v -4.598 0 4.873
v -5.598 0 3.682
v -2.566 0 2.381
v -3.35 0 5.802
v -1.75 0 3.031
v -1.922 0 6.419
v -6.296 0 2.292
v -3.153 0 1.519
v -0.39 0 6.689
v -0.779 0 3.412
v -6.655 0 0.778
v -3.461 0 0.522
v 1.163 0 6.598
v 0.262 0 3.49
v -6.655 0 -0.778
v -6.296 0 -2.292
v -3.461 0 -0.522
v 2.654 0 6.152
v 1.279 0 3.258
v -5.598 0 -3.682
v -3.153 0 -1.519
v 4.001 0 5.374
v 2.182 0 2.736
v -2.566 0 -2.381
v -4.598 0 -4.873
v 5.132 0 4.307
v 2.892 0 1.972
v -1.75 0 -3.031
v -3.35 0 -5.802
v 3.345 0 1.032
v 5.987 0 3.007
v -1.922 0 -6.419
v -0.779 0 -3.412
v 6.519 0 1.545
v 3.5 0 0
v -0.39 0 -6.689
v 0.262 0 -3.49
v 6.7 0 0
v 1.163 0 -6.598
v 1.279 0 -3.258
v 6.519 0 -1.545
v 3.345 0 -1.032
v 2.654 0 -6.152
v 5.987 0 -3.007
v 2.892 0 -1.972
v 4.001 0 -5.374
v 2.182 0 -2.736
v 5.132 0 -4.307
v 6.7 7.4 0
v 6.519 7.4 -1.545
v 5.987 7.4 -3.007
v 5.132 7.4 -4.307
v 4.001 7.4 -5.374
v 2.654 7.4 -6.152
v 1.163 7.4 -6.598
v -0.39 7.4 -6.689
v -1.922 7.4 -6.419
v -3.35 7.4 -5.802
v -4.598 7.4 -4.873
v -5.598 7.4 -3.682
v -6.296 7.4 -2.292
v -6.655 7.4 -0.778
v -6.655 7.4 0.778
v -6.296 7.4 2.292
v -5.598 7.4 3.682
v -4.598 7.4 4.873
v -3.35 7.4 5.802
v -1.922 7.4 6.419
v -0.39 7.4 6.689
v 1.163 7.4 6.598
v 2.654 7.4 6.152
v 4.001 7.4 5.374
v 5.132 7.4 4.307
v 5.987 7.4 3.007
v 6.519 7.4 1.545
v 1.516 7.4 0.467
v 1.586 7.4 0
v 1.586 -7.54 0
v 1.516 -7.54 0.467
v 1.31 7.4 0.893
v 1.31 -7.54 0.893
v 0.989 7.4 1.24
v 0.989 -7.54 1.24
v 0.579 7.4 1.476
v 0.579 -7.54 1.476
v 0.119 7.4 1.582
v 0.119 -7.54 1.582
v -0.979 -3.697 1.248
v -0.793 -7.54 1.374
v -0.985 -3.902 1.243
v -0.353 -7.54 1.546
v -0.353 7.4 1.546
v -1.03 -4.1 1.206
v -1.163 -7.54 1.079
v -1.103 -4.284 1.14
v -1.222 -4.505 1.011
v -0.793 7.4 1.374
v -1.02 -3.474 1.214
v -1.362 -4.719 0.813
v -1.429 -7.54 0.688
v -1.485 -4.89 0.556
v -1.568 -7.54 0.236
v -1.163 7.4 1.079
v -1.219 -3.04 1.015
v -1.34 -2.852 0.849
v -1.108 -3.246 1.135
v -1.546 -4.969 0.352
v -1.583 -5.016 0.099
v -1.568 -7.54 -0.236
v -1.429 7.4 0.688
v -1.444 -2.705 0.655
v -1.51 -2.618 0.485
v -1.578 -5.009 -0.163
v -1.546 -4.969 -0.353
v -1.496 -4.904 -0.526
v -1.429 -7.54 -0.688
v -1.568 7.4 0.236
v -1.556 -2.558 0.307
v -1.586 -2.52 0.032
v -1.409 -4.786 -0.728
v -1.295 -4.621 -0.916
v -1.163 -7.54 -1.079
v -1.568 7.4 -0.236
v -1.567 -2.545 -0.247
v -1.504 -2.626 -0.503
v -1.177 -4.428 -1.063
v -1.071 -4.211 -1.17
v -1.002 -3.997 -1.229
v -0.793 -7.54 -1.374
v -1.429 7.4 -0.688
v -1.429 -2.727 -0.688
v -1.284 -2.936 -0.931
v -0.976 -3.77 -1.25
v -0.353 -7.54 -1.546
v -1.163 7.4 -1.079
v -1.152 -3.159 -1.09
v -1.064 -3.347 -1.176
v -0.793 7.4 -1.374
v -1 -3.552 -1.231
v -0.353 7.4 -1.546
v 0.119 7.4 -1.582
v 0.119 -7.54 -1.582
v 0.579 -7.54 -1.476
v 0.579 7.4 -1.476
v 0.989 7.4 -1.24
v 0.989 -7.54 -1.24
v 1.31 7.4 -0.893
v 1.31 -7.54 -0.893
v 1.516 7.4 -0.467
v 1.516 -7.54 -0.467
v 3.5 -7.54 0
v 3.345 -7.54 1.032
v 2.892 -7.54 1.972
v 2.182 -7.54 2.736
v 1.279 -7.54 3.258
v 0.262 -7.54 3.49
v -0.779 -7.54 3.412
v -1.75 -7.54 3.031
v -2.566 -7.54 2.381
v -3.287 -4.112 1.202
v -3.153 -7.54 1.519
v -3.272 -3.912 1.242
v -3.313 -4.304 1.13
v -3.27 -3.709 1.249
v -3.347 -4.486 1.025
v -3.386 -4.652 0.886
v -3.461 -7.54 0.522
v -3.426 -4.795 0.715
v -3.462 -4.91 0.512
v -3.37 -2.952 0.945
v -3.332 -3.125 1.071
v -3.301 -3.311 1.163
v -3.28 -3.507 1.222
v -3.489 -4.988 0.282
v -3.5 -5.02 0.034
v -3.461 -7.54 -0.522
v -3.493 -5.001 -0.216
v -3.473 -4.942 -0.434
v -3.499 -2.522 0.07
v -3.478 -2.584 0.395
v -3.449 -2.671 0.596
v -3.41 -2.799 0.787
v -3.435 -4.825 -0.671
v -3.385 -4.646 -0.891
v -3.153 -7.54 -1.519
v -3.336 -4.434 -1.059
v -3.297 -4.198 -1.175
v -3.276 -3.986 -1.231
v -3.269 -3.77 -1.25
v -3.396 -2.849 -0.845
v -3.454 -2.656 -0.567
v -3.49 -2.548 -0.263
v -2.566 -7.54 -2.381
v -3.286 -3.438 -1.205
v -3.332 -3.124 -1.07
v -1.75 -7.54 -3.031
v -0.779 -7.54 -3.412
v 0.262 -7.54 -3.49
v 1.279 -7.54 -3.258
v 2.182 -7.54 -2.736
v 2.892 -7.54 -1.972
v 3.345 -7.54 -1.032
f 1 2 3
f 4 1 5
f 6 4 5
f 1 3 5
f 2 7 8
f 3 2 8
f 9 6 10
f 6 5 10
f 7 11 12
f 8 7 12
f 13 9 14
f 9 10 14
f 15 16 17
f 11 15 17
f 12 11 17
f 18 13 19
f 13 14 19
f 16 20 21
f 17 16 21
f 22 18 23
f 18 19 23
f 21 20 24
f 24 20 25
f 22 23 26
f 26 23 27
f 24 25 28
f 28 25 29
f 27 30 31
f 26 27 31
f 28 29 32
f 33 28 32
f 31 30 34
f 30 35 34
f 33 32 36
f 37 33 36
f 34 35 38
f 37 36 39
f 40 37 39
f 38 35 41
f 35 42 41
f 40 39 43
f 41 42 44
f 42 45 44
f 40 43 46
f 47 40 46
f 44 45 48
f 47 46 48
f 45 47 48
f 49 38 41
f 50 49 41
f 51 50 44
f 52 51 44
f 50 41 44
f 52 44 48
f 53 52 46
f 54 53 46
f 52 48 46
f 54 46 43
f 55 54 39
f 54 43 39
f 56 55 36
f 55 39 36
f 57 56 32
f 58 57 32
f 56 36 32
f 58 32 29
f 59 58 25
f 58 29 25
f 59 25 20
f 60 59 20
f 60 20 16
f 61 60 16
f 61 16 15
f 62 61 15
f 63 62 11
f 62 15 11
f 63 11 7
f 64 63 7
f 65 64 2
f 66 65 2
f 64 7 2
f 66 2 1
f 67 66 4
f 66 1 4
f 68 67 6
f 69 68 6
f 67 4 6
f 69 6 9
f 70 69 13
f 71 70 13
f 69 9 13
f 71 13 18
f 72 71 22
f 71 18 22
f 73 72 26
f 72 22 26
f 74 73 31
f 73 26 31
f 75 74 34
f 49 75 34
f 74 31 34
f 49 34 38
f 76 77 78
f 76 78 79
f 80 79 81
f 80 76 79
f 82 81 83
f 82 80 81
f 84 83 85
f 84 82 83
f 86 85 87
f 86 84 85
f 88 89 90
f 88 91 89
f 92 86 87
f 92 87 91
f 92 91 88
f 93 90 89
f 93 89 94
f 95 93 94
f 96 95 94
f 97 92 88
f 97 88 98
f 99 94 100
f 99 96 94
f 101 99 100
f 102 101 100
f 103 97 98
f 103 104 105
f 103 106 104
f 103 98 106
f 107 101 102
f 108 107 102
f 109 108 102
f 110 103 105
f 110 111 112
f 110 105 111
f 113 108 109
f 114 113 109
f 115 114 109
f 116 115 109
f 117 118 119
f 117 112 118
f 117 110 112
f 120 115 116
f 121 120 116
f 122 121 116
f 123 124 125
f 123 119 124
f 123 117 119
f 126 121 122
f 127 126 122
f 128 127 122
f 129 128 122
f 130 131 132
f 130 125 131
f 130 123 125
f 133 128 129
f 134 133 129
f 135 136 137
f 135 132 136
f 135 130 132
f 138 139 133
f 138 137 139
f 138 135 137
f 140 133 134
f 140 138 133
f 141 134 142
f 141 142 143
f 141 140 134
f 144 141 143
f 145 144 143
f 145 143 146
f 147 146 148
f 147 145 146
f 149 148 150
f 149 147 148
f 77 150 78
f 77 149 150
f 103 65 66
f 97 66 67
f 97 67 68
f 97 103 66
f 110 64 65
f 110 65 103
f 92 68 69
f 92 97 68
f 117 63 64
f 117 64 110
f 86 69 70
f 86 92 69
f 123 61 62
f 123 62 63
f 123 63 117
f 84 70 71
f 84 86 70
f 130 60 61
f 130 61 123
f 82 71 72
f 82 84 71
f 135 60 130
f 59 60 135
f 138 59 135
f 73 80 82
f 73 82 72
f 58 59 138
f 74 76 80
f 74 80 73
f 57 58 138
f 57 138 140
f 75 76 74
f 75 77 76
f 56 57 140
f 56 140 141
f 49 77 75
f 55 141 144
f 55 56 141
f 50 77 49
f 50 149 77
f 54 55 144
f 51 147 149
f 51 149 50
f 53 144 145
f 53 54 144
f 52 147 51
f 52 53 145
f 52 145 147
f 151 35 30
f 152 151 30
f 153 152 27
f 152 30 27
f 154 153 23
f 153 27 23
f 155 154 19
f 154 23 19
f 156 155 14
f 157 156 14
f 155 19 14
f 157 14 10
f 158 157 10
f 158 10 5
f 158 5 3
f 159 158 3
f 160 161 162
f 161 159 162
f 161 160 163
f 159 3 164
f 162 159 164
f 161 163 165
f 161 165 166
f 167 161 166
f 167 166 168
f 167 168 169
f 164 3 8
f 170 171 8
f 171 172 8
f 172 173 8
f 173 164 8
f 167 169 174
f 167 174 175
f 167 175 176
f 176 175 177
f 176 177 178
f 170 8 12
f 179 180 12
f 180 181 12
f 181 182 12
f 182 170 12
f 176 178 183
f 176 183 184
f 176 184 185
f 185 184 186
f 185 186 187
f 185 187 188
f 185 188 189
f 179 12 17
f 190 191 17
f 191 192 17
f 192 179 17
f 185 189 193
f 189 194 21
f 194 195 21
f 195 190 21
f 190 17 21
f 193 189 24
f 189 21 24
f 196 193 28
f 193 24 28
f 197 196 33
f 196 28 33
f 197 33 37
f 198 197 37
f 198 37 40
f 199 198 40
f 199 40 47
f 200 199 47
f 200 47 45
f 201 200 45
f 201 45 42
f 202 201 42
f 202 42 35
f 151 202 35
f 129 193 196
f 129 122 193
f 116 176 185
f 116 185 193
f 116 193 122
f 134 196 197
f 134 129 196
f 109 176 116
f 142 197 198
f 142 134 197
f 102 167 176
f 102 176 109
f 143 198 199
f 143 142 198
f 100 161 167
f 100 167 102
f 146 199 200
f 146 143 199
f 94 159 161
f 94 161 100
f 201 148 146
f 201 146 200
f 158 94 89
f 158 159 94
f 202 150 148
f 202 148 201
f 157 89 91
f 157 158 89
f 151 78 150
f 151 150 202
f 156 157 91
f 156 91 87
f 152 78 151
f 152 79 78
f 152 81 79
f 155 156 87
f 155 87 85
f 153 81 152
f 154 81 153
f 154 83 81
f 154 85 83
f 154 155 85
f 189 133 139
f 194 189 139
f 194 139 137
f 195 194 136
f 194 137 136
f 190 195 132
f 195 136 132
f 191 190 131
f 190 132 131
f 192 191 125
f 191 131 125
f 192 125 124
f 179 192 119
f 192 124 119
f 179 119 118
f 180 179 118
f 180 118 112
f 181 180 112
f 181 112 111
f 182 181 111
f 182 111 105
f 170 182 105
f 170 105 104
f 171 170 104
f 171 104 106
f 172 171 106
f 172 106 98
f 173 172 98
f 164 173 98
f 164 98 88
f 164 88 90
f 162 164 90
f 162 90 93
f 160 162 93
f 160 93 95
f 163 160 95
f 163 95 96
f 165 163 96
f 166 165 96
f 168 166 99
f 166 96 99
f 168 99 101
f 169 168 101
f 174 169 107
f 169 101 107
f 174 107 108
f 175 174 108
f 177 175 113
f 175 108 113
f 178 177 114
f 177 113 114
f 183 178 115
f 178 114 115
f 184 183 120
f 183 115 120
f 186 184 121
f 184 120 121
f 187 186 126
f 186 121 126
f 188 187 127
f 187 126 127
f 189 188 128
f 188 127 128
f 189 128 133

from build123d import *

# Parameters (mm, degrees)
SKETCH1_R           = 6.7
SKETCH1_R_2         = 1.586
BOSS_EXTRUDE1_DEPTH = 7.4
SKETCH2_R           = 3.5
SKETCH2_R_2         = 1.586
BOSS_EXTRUDE2_DEPTH = 7.54
SKETCH3_R           = 1.25
CUT_EXTRUDE1_DEPTH  = 10


with BuildPart() as part:
    # Sketch1 → Boss-Extrude1 (new body)
    with BuildSketch(Plane(origin=(0, 0, 0), x_dir=(1, 0, 0), z_dir=(0, 1, 0))):
        Circle(SKETCH1_R)
        Circle(SKETCH1_R_2, mode=Mode.SUBTRACT)
    extrude(amount=BOSS_EXTRUDE1_DEPTH)

    # Sketch2 → Boss-Extrude2 (add)
    with BuildSketch(Plane.XZ):
        Circle(SKETCH2_R)
        Circle(SKETCH2_R_2, mode=Mode.SUBTRACT)
    extrude(amount=BOSS_EXTRUDE2_DEPTH)

    # Sketch3 → Cut-Extrude1 (cut)
    with BuildSketch(Plane(origin=(0, 0, 0), x_dir=(0, 0, -1), z_dir=(1, 0, 0))):
        with Locations((0, -3.77)):
            Circle(SKETCH3_R)
    extrude(amount=-CUT_EXTRUDE1_DEPTH, mode=Mode.SUBTRACT)


solid = part.part
